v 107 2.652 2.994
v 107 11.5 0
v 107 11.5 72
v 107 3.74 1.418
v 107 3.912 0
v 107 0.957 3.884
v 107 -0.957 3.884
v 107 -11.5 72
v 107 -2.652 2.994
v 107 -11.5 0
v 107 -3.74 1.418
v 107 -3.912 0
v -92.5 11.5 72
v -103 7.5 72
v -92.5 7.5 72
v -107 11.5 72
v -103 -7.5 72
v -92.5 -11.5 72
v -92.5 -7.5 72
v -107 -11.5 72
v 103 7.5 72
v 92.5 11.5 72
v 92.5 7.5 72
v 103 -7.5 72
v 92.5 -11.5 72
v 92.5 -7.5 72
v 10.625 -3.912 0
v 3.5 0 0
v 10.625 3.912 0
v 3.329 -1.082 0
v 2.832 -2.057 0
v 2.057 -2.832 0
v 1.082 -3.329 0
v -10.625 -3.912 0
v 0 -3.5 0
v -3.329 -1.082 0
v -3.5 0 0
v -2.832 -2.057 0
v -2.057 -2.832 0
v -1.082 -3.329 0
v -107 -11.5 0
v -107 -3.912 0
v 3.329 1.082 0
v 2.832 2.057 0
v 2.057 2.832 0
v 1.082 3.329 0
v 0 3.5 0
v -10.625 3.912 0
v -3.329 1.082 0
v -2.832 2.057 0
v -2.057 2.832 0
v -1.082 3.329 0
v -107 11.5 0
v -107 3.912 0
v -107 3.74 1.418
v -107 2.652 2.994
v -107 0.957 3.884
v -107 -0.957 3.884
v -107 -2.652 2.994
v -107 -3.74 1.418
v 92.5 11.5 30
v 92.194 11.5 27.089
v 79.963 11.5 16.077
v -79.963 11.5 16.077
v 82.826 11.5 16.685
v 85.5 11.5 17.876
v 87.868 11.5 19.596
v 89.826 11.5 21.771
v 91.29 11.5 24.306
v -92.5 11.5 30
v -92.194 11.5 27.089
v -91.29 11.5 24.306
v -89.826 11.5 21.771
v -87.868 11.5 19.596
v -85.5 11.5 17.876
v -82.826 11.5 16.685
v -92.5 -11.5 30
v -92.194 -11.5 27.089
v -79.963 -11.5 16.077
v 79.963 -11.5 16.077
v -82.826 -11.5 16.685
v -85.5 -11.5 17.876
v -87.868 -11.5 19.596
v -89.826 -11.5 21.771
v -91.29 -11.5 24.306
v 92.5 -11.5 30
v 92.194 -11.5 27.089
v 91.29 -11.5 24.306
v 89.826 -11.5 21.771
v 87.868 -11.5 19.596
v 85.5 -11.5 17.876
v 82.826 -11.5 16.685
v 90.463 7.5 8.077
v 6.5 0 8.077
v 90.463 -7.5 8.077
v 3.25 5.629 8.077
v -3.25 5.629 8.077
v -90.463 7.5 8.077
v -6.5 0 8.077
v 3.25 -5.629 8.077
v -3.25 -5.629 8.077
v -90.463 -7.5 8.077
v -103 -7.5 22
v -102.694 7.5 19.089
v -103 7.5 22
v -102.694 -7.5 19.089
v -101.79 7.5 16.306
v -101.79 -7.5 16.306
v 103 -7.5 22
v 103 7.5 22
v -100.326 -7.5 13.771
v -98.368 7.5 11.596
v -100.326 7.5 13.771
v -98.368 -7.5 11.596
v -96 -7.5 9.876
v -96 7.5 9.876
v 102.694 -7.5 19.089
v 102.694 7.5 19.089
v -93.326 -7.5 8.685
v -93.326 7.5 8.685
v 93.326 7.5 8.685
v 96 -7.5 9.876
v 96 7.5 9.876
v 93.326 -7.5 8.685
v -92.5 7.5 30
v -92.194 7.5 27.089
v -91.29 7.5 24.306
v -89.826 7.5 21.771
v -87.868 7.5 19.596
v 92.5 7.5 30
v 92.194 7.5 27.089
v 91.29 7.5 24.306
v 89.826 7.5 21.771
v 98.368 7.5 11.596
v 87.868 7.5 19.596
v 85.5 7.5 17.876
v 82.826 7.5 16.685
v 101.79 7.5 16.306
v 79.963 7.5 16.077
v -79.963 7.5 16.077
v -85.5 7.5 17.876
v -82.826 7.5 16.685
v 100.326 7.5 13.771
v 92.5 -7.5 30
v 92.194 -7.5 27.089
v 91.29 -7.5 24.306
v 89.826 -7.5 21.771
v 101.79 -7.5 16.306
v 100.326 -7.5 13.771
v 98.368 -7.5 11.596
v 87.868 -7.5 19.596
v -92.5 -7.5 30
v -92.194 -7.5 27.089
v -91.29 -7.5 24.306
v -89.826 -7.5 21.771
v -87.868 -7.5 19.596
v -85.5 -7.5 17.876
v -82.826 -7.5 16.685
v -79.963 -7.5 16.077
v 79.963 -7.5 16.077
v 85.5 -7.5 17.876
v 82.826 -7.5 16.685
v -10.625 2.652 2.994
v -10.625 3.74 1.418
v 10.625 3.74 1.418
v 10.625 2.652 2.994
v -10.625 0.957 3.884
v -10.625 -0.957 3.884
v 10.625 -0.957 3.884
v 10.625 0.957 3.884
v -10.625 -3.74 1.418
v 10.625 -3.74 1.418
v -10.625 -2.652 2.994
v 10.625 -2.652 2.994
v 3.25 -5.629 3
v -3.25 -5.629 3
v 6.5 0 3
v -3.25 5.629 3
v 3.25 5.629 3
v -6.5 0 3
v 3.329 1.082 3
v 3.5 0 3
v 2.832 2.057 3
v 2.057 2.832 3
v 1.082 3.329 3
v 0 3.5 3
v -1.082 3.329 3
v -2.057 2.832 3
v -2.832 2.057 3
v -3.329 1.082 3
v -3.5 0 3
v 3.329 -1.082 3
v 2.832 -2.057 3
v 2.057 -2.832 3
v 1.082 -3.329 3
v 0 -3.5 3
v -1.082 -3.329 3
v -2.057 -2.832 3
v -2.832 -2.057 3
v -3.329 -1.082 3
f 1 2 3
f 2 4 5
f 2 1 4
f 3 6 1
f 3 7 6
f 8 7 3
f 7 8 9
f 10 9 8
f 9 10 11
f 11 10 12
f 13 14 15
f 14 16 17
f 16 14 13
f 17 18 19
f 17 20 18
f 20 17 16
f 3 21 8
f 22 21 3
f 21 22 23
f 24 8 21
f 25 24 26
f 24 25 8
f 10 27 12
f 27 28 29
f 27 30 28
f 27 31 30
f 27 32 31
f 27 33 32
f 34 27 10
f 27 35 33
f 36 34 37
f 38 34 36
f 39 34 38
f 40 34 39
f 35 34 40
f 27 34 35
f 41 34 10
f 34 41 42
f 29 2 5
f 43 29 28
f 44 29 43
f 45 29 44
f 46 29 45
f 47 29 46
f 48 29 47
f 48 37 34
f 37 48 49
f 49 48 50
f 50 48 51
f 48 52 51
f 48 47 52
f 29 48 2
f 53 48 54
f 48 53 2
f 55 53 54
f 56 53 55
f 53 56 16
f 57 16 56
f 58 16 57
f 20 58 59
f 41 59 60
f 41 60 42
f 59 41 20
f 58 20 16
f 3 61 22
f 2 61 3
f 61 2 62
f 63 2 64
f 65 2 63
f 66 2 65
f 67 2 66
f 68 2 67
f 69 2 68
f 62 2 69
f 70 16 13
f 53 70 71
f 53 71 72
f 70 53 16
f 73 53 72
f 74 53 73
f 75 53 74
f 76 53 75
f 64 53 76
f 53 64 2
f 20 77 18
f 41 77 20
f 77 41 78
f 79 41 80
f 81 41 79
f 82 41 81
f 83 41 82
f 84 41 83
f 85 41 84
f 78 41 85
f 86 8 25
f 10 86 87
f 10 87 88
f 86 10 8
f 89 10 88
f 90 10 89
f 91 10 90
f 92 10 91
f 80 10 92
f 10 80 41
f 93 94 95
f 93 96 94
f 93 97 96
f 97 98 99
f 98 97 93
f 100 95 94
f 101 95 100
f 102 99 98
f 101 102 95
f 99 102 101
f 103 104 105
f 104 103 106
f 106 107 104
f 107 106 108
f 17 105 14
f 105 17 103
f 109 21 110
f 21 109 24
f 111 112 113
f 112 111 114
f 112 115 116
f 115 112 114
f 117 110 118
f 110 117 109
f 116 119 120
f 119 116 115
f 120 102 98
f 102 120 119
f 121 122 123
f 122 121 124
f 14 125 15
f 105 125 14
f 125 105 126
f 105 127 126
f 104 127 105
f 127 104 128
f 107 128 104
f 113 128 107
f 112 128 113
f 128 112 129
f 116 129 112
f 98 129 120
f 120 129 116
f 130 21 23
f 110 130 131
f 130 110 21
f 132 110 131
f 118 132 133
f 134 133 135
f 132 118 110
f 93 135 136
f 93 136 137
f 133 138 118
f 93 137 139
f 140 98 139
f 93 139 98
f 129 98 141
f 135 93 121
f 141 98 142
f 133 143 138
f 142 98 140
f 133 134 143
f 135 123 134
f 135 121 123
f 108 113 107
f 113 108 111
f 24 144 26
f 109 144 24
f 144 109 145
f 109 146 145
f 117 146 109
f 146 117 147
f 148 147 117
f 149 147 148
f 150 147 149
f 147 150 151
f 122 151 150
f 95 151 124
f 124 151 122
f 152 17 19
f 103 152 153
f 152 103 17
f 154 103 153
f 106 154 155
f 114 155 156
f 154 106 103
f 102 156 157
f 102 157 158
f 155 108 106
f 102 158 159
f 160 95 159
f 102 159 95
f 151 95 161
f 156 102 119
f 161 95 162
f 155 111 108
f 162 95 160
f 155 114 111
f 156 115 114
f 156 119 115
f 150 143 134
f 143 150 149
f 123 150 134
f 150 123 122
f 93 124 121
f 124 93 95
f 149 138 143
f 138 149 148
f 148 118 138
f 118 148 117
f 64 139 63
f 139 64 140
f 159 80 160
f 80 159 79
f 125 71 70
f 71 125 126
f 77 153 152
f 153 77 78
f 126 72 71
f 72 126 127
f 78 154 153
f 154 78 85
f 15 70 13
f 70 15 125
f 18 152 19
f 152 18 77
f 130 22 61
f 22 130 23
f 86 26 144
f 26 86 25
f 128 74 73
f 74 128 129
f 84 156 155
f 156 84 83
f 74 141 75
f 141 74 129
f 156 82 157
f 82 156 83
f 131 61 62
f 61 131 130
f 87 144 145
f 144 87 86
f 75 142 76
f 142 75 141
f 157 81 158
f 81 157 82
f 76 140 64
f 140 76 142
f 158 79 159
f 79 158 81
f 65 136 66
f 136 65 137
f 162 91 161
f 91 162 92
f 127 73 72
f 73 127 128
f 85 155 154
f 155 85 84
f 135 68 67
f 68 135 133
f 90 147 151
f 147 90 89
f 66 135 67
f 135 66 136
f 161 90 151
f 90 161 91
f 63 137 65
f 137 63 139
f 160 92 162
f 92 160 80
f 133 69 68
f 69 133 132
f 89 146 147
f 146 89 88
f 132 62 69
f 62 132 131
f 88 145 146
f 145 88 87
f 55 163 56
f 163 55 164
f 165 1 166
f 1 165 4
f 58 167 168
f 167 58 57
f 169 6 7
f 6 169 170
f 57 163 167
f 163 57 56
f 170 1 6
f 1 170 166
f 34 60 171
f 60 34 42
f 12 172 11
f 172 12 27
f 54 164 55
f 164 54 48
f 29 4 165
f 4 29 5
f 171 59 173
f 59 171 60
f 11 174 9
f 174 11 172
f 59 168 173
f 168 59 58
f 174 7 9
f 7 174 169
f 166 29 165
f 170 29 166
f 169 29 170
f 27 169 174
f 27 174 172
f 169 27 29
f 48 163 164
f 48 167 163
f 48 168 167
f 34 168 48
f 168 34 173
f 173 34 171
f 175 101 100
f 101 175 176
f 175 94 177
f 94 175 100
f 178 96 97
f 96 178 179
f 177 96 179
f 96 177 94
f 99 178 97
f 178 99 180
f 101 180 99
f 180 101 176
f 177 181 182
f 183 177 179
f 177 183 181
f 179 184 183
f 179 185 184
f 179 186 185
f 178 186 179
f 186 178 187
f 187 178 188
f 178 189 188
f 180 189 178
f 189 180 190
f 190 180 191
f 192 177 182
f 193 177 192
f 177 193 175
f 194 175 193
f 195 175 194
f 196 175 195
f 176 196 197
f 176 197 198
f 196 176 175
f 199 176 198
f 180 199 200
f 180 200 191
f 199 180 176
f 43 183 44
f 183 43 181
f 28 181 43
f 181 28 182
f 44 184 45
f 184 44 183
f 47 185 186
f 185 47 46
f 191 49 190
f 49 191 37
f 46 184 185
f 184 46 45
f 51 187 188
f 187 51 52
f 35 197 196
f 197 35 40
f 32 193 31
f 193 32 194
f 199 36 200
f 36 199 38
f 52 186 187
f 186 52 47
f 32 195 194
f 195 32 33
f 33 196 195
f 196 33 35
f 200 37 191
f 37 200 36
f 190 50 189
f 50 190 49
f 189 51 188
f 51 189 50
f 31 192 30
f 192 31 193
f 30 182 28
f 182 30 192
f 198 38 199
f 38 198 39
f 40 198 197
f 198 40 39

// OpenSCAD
// iPadMiniLandscapeAndCase.scad - bracket to hold an iPadMini in its case in landscape orientation
//   with holes to take a nut, and a be screwed into a tripod.
// by David Phillip Oster  https://www.thingiverse.com/thing:3913046  Version 1.1


/* [Global] */

/* [iPad] */

// long dimension of iPad + case in mm
iPadLength = 205;  // [100:1000]

// thickness of iPad + case in mm
iPadThickness = 14; // [4:50]

// How high the box should come up, gripping the iPad in mm
iPadZ = 64;   // [20:100]

// radius in mm of the left and right curve of the iPad in its case in mm
iPadRadius = 14;  // [0:40]


// wall thickness of case in mm.
wallThickness = 4;  // [1:10]

// "finger" thickness: amount front of case reaches over the ipad in mm.
fingerThickness = 6;  // [1:10]


// How does the mount attach to the tripod?
attachment = "Screw"; // [Wedge:Wedge,Screw:Screw]

/* [Screw] */

/* [Wedge] */

// "z" dimension of top square tripod connector plate in mm
capHeight = 3.95;   // [2:10]

// "x" dimension of top square plate in mm
capWidth = 51.84; // [20:100]

// "y" dimension of top square tipod connector plate in mm
capLength = 51.84; // [20:100]

// the sum of the height of the cap and the wedge in mm.
totalHeight = 13.3;  // [10:100]

// "x" narrowest dimension of bottom wedge plate in mm
wedgeTopWidth = 35;  // [20:100]

// "x" widest dimension of bottom wedge plate in mm
wedgeWidth = 43.1;  // [20:100]

// "y" widest dimension of bottom wedge plate in mm
wedgeLength = 43.8;  // [20:100]

/* [Hidden] */

// extra space around the iPad, so it will actially fit in mm.
iPadClearance = 0.5; // [0:2]

baseHeight = 8;


module tripodWedge() {
  // slide it so it's centered atop 0 at the correct height
  translate([-capWidth/2, -capLength/2, totalHeight - capHeight]){
    cube([capWidth, capLength, capHeight]);
  }

  // slide it so it's centered atop 0.
  translate([0, wedgeLength/2, 0]) {
    // flip it to the correct orientation
    rotate([90, 0, 0]) {
      // make 2D wedge 3D
      linear_extrude(height=wedgeLength) {
        // the wedge in 2D
        polygon([[0,0], [wedgeWidth/2, 0], [wedgeTopWidth/2, totalHeight - capHeight],
                 [-(wedgeTopWidth/2), (totalHeight -  capHeight)], [-wedgeWidth/2, 0]] );
      }
    }
  }
}

// No clearance needed since this comes from measuing the exiting attachment.

// Like cube([x, y, z], except round the corners in the x and y directions by radius r.
module roundedCube(x1, y1, z1, r1) {
  hull() {
    translate([r1, r1, 0]) {
        cylinder(r=r1, h=z1);
    }
    translate([x1-r1, r1, 0]) {
        cylinder(r=r1, h=z1);
    }

    translate([r1, y1-r1, 0]) {
        cylinder(r=r1, h=z1);
    }
    translate([x1-r1, y1-r1, 0]) {
        cylinder(r=r1, h=z1);
    }
  }
}

// the negative space the iPad will take.
module iPadModel() {
  effectiveLength = iPadLength+2*iPadClearance;
  effectiveThickness = iPadThickness+2*iPadClearance;
  translate([-effectiveLength/2, effectiveThickness/2, 0]) {
    rotate([90, 0, 0]) {
      roundedCube(effectiveLength, iPadZ*2, effectiveThickness, iPadRadius);
    }
  }
}

// Slices through the box, to create the "window" to see the iPad screen.
module iPadWindow() {
  translate([(fingerThickness+wallThickness)-(iPadLength/2), (iPadThickness  + 4*(fingerThickness+wallThickness)), 0]) {
    rotate([90, 0, 0]) {
      roundedCube(iPadLength-(2*(fingerThickness+wallThickness)), iPadZ*2-2*fingerThickness, 15*iPadThickness, iPadRadius);
    }
  }
}

// The actual iPad holder, before the cutout for the iPad.
module topHolder() {
  holderLength = 2*(wallThickness+iPadClearance) + iPadLength;
  holderThickness = 2*(wallThickness+iPadClearance) + iPadThickness;
  holderZ = iPadZ+baseHeight;
  translate([-holderLength/2, -holderThickness/2, 0]) {
    cube([holderLength, holderThickness, holderZ]);
  }
}

// Decorative really, a half-round undercut along most of the bottom of the base.
module undercut() {
  translate([-iPadLength, 0, 0]) {
    rotate([0, 90, 0]){
      cylinder(d=8, h=iPadLength*2);
    }
  }
}

// The full holder: the box, minus the iPad and its window plus either the wedge, or the screw support.
module holder() {
  holderThickness = 2*(wallThickness+iPadClearance) + iPadThickness;
  difference() {
  union() {
    difference() {
      topHolder();
      translate([0, 0, baseHeight]) {
        iPadModel();
      }
      translate([0, 0, baseHeight+2*wallThickness]) {
        iPadWindow();
      }
      undercut();
    }
    if (attachment == "Screw") {
      screwThickness = 13 + 2 * wallThickness;
      screwBaseThickness = holderThickness < screwThickness ? screwThickness : holderThickness;
      rotate([0, 0, 45/2]) {
        cylinder(d=screwBaseThickness, h=baseHeight, $fn=8);
      }
    } else if (attachment == "Wedge") {
      translate([0, 0, -(totalHeight - capHeight)]) {
        tripodWedge();
      }
    }
  }
  if (attachment == "Screw") {
      translate([0, 0, baseHeight-5]) {
        cylinder(d=13, h=15, $fn=6);
      }
      cylinder(r=3.5, h=baseHeight-5, $fn=20);
    }
  }
}

holder();
